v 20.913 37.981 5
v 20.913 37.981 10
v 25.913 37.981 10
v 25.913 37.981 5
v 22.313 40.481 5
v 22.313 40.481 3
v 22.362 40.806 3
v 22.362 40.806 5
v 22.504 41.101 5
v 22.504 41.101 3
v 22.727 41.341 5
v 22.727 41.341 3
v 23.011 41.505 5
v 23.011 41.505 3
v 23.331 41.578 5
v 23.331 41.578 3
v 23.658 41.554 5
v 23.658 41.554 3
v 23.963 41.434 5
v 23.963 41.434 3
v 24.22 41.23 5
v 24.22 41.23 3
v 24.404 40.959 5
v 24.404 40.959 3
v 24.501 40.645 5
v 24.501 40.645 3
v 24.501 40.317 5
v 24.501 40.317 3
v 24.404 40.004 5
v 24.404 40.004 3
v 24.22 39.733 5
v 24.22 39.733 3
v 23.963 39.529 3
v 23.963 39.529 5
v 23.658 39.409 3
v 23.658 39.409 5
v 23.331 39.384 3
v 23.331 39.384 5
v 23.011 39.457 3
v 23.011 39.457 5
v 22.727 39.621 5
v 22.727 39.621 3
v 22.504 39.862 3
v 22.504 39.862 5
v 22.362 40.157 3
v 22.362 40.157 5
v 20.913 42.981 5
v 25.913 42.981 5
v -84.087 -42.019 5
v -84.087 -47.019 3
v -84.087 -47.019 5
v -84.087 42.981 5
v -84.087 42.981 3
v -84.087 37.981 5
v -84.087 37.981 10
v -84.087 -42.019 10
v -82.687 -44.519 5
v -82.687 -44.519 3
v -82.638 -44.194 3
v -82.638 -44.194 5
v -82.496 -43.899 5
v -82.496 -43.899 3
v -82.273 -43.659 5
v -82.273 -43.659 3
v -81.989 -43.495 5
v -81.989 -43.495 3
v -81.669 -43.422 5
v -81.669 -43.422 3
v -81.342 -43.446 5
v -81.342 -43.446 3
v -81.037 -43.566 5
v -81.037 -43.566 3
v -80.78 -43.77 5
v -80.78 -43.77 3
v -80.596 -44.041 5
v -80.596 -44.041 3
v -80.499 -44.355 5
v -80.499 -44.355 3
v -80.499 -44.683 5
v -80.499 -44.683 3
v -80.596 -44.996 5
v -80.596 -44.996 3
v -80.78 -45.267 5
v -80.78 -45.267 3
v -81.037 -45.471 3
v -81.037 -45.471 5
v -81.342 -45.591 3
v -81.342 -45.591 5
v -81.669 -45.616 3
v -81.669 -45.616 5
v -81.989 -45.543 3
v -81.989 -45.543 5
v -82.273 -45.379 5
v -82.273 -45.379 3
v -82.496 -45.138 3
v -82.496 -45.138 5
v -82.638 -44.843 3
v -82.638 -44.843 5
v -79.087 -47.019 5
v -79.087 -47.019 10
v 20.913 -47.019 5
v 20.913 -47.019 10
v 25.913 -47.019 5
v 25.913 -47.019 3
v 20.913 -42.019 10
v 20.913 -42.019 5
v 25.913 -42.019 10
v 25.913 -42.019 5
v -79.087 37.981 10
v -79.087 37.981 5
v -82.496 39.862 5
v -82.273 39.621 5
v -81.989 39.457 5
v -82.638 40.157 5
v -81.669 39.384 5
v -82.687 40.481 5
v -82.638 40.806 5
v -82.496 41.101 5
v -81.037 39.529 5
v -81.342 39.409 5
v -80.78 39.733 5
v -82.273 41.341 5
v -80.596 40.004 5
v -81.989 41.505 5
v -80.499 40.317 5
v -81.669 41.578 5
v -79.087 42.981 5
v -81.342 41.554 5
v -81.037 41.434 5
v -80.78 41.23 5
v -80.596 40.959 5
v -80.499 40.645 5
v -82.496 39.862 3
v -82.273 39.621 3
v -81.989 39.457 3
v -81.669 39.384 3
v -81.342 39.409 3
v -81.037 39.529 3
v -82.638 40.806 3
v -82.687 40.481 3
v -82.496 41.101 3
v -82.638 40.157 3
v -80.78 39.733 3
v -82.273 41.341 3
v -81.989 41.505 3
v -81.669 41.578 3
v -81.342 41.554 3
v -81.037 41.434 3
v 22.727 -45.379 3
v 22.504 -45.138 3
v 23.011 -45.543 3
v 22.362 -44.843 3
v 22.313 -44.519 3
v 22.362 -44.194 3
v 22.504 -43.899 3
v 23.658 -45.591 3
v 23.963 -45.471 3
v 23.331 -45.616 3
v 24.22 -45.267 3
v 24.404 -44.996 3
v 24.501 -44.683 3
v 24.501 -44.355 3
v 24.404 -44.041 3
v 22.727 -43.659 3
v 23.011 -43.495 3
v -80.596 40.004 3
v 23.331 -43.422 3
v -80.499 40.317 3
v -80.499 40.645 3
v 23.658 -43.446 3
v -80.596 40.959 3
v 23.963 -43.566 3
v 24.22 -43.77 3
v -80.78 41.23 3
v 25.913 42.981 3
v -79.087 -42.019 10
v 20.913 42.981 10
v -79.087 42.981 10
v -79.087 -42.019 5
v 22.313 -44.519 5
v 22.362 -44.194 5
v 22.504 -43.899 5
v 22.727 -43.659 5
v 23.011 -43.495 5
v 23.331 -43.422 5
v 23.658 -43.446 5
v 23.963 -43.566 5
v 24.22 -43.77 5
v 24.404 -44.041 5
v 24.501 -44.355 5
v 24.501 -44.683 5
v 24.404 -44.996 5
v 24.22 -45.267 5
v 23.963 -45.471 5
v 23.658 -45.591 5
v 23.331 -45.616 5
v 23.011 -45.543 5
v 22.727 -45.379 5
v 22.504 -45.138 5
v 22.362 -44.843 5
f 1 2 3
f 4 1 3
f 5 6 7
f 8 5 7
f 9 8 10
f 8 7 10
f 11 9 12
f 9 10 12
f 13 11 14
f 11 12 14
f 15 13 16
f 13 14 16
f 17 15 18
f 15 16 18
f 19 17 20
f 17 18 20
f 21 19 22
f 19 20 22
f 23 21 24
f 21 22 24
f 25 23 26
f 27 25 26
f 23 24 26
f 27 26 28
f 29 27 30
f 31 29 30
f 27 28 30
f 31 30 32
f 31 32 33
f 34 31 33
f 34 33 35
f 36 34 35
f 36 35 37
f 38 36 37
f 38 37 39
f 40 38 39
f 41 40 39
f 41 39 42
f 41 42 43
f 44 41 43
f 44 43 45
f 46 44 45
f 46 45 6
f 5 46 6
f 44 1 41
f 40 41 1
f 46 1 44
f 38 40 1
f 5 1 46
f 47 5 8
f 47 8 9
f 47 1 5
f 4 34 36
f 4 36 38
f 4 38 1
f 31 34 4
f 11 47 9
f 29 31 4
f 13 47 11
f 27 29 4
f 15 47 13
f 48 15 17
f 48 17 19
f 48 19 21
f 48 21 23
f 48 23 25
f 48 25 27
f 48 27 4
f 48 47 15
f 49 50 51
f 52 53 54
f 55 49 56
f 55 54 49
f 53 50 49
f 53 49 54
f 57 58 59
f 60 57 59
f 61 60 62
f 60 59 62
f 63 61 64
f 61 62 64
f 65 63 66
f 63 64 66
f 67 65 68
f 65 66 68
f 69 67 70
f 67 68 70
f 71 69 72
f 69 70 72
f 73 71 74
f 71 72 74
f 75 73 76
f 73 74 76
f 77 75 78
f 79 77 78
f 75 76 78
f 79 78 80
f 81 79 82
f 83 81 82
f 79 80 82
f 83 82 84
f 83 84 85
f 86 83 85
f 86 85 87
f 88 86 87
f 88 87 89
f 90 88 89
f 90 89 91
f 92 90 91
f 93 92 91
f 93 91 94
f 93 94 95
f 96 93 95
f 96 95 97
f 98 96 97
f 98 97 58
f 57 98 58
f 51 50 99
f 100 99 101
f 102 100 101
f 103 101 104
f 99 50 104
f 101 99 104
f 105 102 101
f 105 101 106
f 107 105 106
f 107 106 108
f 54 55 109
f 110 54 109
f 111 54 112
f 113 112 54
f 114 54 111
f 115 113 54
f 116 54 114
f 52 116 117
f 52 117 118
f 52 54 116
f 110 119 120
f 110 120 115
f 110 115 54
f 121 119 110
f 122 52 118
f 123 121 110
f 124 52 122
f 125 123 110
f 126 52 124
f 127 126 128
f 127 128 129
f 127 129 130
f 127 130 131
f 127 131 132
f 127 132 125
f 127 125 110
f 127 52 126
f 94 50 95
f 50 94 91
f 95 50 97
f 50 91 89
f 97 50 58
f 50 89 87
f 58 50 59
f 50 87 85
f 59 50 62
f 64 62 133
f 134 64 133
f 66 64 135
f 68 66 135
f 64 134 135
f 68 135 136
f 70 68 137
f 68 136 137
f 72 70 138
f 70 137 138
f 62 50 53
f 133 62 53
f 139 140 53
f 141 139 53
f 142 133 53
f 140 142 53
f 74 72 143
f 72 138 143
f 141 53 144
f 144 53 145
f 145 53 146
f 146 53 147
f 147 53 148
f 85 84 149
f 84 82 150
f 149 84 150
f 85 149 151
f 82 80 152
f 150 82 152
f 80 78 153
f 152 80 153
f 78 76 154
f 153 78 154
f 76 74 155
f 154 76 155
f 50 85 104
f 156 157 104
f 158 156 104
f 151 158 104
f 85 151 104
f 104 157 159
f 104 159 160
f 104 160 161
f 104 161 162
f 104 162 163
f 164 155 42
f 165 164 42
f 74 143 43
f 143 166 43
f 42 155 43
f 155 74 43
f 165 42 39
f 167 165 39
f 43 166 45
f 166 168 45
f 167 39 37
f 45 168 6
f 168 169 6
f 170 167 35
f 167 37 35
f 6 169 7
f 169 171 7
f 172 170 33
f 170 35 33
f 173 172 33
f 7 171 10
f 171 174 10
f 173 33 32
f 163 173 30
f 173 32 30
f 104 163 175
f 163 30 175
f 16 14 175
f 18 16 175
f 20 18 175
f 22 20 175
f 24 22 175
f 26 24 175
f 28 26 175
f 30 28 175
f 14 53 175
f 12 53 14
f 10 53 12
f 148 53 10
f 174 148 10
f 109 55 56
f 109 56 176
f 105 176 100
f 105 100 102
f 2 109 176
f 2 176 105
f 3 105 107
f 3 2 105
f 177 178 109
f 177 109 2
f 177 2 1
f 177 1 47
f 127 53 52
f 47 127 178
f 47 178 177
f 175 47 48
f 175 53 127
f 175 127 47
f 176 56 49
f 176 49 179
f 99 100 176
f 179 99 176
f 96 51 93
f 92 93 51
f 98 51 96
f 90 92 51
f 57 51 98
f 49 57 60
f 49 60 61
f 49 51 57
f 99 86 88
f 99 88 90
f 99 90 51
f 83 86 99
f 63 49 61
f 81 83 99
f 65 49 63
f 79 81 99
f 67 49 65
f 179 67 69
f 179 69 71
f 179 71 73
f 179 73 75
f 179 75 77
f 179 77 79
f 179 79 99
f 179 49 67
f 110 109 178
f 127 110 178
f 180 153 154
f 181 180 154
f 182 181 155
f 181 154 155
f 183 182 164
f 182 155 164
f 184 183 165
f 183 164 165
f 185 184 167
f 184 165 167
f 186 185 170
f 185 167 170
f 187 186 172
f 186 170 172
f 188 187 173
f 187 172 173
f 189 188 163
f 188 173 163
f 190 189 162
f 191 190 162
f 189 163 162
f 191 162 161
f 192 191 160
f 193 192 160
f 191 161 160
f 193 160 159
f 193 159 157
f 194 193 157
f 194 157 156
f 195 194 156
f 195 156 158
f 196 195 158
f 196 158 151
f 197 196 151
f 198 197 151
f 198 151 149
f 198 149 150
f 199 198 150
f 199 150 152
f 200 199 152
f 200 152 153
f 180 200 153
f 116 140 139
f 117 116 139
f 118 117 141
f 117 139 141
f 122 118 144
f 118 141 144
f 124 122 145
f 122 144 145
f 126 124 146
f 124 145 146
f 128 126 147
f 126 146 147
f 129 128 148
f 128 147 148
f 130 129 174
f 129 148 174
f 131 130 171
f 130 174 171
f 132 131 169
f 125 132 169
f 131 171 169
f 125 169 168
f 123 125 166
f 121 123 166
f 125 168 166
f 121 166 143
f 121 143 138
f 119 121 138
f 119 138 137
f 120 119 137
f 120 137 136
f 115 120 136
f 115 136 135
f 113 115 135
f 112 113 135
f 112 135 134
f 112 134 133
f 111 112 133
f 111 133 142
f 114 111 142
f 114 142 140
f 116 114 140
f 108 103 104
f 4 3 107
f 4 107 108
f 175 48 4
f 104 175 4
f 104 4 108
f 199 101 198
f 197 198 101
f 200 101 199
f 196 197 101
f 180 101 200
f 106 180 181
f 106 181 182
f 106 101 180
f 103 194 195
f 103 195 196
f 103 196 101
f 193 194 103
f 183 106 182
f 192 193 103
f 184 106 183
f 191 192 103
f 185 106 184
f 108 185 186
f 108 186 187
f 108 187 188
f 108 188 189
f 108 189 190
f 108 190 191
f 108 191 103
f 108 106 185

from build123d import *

# Parameters (mm, degrees)
SKETCH_1_W          = 120
SKETCH_1_H          = 90
EXTRUDE_1_DEPTH     = 10
SKETCH_6_W          = 5
SKETCH_6_H          = 5
CUT_EXTRUDE_4_DEPTH = 5
SKETCH_7_W          = 5
SKETCH_7_H          = 5
CUT_EXTRUDE_5_DEPTH = 3
SKETCH_8_R          = 1.1
CUT_EXTRUDE_6_DEPTH = 42
SKETCH_10_W         = 120
SKETCH_10_H         = 90
CUT_EXTRUDE_7_DEPTH = 3
SKETCH_11_W         = 7
SKETCH_11_H         = 90
CUT_EXTRUDE_8_DEPTH = 5
SKETCH_12_W         = 7
SKETCH_12_H         = 90
CUT_EXTRUDE_9_DEPTH = 5


with BuildPart() as part:
    # 草圖1 → 填料-伸長1 (new body)
    with BuildSketch(Plane.XY):
        with Locations((-29.08671555, -2.01863354)):
            Rectangle(SKETCH_1_W, SKETCH_1_H)
    extrude(amount=EXTRUDE_1_DEPTH)

    # 草圖6 → 除料-伸長4 (cut)
    with BuildSketch(Plane.XY.offset(10)):
        with Locations((23.41328445, 40.48136646)):
            Rectangle(SKETCH_6_W, SKETCH_6_H)
        with Locations((-81.58671555, 40.48136646)):
            Rectangle(SKETCH_6_W, SKETCH_6_H)
        with Locations((-81.58671555, -44.51863354)):
            Rectangle(SKETCH_6_W, SKETCH_6_H)
        with Locations((23.41328445, -44.51863354)):
            Rectangle(SKETCH_6_W, SKETCH_6_H)
    extrude(amount=-CUT_EXTRUDE_4_DEPTH, mode=Mode.SUBTRACT)

    # 草圖7 → 除料-伸長5 (cut)
    with BuildSketch(Plane(origin=(0, 0, 0), x_dir=(-1, 0, 0), z_dir=(0, 0, -1))):
        with Locations((81.58671555, 40.48136646)):
            Rectangle(SKETCH_7_W, SKETCH_7_H)
        with Locations((-23.41328445, 40.48136646)):
            Rectangle(SKETCH_7_W, SKETCH_7_H)
        with Locations((81.58671555, -44.51863354)):
            Rectangle(SKETCH_7_W, SKETCH_7_H)
        with Locations((-23.41328445, -44.51863354)):
            Rectangle(SKETCH_7_W, SKETCH_7_H)
    extrude(amount=-CUT_EXTRUDE_5_DEPTH, mode=Mode.SUBTRACT)

    # 草圖8 → 除料-伸長6 (cut)
    with BuildSketch(Plane(origin=(0, 0, 0), x_dir=(-1, 0, 0), z_dir=(0, 0, -1))):
        with Locations((-23.41328445, 40.48136646)):
            Circle(SKETCH_8_R)
        with Locations((81.58671555, 40.48136646)):
            Circle(SKETCH_8_R)
        with Locations((81.58671555, -44.51863354)):
            Circle(SKETCH_8_R)
        with Locations((-23.41328445, -44.51863354)):
            Circle(SKETCH_8_R)
    extrude(amount=-CUT_EXTRUDE_6_DEPTH, mode=Mode.SUBTRACT)

    # 草圖10 → 除料-伸長7 (cut)
    with BuildSketch(Plane.XY):
        with Locations((-29.08671555, -2.01863354)):
            Rectangle(SKETCH_10_W, SKETCH_10_H)
    extrude(amount=CUT_EXTRUDE_7_DEPTH, mode=Mode.SUBTRACT)

    # 草圖11 → 除料-伸長8 (cut)
    with BuildSketch(Plane(origin=(30.91328445, 0, 0), x_dir=(0, 0, -1), z_dir=(1, 0, 0))):
        with Locations((-6.5, -2.01863354)):
            Rectangle(SKETCH_11_W, SKETCH_11_H)
    extrude(amount=-CUT_EXTRUDE_8_DEPTH, mode=Mode.SUBTRACT)

    # 草圖12 → 除料-伸長9 (cut)
    with BuildSketch(Plane.ZY.offset(89.08671555)):
        with Locations((6.5, -2.01863354)):
            Rectangle(SKETCH_12_W, SKETCH_12_H)
    extrude(amount=-CUT_EXTRUDE_9_DEPTH, mode=Mode.SUBTRACT)


solid = part.part
